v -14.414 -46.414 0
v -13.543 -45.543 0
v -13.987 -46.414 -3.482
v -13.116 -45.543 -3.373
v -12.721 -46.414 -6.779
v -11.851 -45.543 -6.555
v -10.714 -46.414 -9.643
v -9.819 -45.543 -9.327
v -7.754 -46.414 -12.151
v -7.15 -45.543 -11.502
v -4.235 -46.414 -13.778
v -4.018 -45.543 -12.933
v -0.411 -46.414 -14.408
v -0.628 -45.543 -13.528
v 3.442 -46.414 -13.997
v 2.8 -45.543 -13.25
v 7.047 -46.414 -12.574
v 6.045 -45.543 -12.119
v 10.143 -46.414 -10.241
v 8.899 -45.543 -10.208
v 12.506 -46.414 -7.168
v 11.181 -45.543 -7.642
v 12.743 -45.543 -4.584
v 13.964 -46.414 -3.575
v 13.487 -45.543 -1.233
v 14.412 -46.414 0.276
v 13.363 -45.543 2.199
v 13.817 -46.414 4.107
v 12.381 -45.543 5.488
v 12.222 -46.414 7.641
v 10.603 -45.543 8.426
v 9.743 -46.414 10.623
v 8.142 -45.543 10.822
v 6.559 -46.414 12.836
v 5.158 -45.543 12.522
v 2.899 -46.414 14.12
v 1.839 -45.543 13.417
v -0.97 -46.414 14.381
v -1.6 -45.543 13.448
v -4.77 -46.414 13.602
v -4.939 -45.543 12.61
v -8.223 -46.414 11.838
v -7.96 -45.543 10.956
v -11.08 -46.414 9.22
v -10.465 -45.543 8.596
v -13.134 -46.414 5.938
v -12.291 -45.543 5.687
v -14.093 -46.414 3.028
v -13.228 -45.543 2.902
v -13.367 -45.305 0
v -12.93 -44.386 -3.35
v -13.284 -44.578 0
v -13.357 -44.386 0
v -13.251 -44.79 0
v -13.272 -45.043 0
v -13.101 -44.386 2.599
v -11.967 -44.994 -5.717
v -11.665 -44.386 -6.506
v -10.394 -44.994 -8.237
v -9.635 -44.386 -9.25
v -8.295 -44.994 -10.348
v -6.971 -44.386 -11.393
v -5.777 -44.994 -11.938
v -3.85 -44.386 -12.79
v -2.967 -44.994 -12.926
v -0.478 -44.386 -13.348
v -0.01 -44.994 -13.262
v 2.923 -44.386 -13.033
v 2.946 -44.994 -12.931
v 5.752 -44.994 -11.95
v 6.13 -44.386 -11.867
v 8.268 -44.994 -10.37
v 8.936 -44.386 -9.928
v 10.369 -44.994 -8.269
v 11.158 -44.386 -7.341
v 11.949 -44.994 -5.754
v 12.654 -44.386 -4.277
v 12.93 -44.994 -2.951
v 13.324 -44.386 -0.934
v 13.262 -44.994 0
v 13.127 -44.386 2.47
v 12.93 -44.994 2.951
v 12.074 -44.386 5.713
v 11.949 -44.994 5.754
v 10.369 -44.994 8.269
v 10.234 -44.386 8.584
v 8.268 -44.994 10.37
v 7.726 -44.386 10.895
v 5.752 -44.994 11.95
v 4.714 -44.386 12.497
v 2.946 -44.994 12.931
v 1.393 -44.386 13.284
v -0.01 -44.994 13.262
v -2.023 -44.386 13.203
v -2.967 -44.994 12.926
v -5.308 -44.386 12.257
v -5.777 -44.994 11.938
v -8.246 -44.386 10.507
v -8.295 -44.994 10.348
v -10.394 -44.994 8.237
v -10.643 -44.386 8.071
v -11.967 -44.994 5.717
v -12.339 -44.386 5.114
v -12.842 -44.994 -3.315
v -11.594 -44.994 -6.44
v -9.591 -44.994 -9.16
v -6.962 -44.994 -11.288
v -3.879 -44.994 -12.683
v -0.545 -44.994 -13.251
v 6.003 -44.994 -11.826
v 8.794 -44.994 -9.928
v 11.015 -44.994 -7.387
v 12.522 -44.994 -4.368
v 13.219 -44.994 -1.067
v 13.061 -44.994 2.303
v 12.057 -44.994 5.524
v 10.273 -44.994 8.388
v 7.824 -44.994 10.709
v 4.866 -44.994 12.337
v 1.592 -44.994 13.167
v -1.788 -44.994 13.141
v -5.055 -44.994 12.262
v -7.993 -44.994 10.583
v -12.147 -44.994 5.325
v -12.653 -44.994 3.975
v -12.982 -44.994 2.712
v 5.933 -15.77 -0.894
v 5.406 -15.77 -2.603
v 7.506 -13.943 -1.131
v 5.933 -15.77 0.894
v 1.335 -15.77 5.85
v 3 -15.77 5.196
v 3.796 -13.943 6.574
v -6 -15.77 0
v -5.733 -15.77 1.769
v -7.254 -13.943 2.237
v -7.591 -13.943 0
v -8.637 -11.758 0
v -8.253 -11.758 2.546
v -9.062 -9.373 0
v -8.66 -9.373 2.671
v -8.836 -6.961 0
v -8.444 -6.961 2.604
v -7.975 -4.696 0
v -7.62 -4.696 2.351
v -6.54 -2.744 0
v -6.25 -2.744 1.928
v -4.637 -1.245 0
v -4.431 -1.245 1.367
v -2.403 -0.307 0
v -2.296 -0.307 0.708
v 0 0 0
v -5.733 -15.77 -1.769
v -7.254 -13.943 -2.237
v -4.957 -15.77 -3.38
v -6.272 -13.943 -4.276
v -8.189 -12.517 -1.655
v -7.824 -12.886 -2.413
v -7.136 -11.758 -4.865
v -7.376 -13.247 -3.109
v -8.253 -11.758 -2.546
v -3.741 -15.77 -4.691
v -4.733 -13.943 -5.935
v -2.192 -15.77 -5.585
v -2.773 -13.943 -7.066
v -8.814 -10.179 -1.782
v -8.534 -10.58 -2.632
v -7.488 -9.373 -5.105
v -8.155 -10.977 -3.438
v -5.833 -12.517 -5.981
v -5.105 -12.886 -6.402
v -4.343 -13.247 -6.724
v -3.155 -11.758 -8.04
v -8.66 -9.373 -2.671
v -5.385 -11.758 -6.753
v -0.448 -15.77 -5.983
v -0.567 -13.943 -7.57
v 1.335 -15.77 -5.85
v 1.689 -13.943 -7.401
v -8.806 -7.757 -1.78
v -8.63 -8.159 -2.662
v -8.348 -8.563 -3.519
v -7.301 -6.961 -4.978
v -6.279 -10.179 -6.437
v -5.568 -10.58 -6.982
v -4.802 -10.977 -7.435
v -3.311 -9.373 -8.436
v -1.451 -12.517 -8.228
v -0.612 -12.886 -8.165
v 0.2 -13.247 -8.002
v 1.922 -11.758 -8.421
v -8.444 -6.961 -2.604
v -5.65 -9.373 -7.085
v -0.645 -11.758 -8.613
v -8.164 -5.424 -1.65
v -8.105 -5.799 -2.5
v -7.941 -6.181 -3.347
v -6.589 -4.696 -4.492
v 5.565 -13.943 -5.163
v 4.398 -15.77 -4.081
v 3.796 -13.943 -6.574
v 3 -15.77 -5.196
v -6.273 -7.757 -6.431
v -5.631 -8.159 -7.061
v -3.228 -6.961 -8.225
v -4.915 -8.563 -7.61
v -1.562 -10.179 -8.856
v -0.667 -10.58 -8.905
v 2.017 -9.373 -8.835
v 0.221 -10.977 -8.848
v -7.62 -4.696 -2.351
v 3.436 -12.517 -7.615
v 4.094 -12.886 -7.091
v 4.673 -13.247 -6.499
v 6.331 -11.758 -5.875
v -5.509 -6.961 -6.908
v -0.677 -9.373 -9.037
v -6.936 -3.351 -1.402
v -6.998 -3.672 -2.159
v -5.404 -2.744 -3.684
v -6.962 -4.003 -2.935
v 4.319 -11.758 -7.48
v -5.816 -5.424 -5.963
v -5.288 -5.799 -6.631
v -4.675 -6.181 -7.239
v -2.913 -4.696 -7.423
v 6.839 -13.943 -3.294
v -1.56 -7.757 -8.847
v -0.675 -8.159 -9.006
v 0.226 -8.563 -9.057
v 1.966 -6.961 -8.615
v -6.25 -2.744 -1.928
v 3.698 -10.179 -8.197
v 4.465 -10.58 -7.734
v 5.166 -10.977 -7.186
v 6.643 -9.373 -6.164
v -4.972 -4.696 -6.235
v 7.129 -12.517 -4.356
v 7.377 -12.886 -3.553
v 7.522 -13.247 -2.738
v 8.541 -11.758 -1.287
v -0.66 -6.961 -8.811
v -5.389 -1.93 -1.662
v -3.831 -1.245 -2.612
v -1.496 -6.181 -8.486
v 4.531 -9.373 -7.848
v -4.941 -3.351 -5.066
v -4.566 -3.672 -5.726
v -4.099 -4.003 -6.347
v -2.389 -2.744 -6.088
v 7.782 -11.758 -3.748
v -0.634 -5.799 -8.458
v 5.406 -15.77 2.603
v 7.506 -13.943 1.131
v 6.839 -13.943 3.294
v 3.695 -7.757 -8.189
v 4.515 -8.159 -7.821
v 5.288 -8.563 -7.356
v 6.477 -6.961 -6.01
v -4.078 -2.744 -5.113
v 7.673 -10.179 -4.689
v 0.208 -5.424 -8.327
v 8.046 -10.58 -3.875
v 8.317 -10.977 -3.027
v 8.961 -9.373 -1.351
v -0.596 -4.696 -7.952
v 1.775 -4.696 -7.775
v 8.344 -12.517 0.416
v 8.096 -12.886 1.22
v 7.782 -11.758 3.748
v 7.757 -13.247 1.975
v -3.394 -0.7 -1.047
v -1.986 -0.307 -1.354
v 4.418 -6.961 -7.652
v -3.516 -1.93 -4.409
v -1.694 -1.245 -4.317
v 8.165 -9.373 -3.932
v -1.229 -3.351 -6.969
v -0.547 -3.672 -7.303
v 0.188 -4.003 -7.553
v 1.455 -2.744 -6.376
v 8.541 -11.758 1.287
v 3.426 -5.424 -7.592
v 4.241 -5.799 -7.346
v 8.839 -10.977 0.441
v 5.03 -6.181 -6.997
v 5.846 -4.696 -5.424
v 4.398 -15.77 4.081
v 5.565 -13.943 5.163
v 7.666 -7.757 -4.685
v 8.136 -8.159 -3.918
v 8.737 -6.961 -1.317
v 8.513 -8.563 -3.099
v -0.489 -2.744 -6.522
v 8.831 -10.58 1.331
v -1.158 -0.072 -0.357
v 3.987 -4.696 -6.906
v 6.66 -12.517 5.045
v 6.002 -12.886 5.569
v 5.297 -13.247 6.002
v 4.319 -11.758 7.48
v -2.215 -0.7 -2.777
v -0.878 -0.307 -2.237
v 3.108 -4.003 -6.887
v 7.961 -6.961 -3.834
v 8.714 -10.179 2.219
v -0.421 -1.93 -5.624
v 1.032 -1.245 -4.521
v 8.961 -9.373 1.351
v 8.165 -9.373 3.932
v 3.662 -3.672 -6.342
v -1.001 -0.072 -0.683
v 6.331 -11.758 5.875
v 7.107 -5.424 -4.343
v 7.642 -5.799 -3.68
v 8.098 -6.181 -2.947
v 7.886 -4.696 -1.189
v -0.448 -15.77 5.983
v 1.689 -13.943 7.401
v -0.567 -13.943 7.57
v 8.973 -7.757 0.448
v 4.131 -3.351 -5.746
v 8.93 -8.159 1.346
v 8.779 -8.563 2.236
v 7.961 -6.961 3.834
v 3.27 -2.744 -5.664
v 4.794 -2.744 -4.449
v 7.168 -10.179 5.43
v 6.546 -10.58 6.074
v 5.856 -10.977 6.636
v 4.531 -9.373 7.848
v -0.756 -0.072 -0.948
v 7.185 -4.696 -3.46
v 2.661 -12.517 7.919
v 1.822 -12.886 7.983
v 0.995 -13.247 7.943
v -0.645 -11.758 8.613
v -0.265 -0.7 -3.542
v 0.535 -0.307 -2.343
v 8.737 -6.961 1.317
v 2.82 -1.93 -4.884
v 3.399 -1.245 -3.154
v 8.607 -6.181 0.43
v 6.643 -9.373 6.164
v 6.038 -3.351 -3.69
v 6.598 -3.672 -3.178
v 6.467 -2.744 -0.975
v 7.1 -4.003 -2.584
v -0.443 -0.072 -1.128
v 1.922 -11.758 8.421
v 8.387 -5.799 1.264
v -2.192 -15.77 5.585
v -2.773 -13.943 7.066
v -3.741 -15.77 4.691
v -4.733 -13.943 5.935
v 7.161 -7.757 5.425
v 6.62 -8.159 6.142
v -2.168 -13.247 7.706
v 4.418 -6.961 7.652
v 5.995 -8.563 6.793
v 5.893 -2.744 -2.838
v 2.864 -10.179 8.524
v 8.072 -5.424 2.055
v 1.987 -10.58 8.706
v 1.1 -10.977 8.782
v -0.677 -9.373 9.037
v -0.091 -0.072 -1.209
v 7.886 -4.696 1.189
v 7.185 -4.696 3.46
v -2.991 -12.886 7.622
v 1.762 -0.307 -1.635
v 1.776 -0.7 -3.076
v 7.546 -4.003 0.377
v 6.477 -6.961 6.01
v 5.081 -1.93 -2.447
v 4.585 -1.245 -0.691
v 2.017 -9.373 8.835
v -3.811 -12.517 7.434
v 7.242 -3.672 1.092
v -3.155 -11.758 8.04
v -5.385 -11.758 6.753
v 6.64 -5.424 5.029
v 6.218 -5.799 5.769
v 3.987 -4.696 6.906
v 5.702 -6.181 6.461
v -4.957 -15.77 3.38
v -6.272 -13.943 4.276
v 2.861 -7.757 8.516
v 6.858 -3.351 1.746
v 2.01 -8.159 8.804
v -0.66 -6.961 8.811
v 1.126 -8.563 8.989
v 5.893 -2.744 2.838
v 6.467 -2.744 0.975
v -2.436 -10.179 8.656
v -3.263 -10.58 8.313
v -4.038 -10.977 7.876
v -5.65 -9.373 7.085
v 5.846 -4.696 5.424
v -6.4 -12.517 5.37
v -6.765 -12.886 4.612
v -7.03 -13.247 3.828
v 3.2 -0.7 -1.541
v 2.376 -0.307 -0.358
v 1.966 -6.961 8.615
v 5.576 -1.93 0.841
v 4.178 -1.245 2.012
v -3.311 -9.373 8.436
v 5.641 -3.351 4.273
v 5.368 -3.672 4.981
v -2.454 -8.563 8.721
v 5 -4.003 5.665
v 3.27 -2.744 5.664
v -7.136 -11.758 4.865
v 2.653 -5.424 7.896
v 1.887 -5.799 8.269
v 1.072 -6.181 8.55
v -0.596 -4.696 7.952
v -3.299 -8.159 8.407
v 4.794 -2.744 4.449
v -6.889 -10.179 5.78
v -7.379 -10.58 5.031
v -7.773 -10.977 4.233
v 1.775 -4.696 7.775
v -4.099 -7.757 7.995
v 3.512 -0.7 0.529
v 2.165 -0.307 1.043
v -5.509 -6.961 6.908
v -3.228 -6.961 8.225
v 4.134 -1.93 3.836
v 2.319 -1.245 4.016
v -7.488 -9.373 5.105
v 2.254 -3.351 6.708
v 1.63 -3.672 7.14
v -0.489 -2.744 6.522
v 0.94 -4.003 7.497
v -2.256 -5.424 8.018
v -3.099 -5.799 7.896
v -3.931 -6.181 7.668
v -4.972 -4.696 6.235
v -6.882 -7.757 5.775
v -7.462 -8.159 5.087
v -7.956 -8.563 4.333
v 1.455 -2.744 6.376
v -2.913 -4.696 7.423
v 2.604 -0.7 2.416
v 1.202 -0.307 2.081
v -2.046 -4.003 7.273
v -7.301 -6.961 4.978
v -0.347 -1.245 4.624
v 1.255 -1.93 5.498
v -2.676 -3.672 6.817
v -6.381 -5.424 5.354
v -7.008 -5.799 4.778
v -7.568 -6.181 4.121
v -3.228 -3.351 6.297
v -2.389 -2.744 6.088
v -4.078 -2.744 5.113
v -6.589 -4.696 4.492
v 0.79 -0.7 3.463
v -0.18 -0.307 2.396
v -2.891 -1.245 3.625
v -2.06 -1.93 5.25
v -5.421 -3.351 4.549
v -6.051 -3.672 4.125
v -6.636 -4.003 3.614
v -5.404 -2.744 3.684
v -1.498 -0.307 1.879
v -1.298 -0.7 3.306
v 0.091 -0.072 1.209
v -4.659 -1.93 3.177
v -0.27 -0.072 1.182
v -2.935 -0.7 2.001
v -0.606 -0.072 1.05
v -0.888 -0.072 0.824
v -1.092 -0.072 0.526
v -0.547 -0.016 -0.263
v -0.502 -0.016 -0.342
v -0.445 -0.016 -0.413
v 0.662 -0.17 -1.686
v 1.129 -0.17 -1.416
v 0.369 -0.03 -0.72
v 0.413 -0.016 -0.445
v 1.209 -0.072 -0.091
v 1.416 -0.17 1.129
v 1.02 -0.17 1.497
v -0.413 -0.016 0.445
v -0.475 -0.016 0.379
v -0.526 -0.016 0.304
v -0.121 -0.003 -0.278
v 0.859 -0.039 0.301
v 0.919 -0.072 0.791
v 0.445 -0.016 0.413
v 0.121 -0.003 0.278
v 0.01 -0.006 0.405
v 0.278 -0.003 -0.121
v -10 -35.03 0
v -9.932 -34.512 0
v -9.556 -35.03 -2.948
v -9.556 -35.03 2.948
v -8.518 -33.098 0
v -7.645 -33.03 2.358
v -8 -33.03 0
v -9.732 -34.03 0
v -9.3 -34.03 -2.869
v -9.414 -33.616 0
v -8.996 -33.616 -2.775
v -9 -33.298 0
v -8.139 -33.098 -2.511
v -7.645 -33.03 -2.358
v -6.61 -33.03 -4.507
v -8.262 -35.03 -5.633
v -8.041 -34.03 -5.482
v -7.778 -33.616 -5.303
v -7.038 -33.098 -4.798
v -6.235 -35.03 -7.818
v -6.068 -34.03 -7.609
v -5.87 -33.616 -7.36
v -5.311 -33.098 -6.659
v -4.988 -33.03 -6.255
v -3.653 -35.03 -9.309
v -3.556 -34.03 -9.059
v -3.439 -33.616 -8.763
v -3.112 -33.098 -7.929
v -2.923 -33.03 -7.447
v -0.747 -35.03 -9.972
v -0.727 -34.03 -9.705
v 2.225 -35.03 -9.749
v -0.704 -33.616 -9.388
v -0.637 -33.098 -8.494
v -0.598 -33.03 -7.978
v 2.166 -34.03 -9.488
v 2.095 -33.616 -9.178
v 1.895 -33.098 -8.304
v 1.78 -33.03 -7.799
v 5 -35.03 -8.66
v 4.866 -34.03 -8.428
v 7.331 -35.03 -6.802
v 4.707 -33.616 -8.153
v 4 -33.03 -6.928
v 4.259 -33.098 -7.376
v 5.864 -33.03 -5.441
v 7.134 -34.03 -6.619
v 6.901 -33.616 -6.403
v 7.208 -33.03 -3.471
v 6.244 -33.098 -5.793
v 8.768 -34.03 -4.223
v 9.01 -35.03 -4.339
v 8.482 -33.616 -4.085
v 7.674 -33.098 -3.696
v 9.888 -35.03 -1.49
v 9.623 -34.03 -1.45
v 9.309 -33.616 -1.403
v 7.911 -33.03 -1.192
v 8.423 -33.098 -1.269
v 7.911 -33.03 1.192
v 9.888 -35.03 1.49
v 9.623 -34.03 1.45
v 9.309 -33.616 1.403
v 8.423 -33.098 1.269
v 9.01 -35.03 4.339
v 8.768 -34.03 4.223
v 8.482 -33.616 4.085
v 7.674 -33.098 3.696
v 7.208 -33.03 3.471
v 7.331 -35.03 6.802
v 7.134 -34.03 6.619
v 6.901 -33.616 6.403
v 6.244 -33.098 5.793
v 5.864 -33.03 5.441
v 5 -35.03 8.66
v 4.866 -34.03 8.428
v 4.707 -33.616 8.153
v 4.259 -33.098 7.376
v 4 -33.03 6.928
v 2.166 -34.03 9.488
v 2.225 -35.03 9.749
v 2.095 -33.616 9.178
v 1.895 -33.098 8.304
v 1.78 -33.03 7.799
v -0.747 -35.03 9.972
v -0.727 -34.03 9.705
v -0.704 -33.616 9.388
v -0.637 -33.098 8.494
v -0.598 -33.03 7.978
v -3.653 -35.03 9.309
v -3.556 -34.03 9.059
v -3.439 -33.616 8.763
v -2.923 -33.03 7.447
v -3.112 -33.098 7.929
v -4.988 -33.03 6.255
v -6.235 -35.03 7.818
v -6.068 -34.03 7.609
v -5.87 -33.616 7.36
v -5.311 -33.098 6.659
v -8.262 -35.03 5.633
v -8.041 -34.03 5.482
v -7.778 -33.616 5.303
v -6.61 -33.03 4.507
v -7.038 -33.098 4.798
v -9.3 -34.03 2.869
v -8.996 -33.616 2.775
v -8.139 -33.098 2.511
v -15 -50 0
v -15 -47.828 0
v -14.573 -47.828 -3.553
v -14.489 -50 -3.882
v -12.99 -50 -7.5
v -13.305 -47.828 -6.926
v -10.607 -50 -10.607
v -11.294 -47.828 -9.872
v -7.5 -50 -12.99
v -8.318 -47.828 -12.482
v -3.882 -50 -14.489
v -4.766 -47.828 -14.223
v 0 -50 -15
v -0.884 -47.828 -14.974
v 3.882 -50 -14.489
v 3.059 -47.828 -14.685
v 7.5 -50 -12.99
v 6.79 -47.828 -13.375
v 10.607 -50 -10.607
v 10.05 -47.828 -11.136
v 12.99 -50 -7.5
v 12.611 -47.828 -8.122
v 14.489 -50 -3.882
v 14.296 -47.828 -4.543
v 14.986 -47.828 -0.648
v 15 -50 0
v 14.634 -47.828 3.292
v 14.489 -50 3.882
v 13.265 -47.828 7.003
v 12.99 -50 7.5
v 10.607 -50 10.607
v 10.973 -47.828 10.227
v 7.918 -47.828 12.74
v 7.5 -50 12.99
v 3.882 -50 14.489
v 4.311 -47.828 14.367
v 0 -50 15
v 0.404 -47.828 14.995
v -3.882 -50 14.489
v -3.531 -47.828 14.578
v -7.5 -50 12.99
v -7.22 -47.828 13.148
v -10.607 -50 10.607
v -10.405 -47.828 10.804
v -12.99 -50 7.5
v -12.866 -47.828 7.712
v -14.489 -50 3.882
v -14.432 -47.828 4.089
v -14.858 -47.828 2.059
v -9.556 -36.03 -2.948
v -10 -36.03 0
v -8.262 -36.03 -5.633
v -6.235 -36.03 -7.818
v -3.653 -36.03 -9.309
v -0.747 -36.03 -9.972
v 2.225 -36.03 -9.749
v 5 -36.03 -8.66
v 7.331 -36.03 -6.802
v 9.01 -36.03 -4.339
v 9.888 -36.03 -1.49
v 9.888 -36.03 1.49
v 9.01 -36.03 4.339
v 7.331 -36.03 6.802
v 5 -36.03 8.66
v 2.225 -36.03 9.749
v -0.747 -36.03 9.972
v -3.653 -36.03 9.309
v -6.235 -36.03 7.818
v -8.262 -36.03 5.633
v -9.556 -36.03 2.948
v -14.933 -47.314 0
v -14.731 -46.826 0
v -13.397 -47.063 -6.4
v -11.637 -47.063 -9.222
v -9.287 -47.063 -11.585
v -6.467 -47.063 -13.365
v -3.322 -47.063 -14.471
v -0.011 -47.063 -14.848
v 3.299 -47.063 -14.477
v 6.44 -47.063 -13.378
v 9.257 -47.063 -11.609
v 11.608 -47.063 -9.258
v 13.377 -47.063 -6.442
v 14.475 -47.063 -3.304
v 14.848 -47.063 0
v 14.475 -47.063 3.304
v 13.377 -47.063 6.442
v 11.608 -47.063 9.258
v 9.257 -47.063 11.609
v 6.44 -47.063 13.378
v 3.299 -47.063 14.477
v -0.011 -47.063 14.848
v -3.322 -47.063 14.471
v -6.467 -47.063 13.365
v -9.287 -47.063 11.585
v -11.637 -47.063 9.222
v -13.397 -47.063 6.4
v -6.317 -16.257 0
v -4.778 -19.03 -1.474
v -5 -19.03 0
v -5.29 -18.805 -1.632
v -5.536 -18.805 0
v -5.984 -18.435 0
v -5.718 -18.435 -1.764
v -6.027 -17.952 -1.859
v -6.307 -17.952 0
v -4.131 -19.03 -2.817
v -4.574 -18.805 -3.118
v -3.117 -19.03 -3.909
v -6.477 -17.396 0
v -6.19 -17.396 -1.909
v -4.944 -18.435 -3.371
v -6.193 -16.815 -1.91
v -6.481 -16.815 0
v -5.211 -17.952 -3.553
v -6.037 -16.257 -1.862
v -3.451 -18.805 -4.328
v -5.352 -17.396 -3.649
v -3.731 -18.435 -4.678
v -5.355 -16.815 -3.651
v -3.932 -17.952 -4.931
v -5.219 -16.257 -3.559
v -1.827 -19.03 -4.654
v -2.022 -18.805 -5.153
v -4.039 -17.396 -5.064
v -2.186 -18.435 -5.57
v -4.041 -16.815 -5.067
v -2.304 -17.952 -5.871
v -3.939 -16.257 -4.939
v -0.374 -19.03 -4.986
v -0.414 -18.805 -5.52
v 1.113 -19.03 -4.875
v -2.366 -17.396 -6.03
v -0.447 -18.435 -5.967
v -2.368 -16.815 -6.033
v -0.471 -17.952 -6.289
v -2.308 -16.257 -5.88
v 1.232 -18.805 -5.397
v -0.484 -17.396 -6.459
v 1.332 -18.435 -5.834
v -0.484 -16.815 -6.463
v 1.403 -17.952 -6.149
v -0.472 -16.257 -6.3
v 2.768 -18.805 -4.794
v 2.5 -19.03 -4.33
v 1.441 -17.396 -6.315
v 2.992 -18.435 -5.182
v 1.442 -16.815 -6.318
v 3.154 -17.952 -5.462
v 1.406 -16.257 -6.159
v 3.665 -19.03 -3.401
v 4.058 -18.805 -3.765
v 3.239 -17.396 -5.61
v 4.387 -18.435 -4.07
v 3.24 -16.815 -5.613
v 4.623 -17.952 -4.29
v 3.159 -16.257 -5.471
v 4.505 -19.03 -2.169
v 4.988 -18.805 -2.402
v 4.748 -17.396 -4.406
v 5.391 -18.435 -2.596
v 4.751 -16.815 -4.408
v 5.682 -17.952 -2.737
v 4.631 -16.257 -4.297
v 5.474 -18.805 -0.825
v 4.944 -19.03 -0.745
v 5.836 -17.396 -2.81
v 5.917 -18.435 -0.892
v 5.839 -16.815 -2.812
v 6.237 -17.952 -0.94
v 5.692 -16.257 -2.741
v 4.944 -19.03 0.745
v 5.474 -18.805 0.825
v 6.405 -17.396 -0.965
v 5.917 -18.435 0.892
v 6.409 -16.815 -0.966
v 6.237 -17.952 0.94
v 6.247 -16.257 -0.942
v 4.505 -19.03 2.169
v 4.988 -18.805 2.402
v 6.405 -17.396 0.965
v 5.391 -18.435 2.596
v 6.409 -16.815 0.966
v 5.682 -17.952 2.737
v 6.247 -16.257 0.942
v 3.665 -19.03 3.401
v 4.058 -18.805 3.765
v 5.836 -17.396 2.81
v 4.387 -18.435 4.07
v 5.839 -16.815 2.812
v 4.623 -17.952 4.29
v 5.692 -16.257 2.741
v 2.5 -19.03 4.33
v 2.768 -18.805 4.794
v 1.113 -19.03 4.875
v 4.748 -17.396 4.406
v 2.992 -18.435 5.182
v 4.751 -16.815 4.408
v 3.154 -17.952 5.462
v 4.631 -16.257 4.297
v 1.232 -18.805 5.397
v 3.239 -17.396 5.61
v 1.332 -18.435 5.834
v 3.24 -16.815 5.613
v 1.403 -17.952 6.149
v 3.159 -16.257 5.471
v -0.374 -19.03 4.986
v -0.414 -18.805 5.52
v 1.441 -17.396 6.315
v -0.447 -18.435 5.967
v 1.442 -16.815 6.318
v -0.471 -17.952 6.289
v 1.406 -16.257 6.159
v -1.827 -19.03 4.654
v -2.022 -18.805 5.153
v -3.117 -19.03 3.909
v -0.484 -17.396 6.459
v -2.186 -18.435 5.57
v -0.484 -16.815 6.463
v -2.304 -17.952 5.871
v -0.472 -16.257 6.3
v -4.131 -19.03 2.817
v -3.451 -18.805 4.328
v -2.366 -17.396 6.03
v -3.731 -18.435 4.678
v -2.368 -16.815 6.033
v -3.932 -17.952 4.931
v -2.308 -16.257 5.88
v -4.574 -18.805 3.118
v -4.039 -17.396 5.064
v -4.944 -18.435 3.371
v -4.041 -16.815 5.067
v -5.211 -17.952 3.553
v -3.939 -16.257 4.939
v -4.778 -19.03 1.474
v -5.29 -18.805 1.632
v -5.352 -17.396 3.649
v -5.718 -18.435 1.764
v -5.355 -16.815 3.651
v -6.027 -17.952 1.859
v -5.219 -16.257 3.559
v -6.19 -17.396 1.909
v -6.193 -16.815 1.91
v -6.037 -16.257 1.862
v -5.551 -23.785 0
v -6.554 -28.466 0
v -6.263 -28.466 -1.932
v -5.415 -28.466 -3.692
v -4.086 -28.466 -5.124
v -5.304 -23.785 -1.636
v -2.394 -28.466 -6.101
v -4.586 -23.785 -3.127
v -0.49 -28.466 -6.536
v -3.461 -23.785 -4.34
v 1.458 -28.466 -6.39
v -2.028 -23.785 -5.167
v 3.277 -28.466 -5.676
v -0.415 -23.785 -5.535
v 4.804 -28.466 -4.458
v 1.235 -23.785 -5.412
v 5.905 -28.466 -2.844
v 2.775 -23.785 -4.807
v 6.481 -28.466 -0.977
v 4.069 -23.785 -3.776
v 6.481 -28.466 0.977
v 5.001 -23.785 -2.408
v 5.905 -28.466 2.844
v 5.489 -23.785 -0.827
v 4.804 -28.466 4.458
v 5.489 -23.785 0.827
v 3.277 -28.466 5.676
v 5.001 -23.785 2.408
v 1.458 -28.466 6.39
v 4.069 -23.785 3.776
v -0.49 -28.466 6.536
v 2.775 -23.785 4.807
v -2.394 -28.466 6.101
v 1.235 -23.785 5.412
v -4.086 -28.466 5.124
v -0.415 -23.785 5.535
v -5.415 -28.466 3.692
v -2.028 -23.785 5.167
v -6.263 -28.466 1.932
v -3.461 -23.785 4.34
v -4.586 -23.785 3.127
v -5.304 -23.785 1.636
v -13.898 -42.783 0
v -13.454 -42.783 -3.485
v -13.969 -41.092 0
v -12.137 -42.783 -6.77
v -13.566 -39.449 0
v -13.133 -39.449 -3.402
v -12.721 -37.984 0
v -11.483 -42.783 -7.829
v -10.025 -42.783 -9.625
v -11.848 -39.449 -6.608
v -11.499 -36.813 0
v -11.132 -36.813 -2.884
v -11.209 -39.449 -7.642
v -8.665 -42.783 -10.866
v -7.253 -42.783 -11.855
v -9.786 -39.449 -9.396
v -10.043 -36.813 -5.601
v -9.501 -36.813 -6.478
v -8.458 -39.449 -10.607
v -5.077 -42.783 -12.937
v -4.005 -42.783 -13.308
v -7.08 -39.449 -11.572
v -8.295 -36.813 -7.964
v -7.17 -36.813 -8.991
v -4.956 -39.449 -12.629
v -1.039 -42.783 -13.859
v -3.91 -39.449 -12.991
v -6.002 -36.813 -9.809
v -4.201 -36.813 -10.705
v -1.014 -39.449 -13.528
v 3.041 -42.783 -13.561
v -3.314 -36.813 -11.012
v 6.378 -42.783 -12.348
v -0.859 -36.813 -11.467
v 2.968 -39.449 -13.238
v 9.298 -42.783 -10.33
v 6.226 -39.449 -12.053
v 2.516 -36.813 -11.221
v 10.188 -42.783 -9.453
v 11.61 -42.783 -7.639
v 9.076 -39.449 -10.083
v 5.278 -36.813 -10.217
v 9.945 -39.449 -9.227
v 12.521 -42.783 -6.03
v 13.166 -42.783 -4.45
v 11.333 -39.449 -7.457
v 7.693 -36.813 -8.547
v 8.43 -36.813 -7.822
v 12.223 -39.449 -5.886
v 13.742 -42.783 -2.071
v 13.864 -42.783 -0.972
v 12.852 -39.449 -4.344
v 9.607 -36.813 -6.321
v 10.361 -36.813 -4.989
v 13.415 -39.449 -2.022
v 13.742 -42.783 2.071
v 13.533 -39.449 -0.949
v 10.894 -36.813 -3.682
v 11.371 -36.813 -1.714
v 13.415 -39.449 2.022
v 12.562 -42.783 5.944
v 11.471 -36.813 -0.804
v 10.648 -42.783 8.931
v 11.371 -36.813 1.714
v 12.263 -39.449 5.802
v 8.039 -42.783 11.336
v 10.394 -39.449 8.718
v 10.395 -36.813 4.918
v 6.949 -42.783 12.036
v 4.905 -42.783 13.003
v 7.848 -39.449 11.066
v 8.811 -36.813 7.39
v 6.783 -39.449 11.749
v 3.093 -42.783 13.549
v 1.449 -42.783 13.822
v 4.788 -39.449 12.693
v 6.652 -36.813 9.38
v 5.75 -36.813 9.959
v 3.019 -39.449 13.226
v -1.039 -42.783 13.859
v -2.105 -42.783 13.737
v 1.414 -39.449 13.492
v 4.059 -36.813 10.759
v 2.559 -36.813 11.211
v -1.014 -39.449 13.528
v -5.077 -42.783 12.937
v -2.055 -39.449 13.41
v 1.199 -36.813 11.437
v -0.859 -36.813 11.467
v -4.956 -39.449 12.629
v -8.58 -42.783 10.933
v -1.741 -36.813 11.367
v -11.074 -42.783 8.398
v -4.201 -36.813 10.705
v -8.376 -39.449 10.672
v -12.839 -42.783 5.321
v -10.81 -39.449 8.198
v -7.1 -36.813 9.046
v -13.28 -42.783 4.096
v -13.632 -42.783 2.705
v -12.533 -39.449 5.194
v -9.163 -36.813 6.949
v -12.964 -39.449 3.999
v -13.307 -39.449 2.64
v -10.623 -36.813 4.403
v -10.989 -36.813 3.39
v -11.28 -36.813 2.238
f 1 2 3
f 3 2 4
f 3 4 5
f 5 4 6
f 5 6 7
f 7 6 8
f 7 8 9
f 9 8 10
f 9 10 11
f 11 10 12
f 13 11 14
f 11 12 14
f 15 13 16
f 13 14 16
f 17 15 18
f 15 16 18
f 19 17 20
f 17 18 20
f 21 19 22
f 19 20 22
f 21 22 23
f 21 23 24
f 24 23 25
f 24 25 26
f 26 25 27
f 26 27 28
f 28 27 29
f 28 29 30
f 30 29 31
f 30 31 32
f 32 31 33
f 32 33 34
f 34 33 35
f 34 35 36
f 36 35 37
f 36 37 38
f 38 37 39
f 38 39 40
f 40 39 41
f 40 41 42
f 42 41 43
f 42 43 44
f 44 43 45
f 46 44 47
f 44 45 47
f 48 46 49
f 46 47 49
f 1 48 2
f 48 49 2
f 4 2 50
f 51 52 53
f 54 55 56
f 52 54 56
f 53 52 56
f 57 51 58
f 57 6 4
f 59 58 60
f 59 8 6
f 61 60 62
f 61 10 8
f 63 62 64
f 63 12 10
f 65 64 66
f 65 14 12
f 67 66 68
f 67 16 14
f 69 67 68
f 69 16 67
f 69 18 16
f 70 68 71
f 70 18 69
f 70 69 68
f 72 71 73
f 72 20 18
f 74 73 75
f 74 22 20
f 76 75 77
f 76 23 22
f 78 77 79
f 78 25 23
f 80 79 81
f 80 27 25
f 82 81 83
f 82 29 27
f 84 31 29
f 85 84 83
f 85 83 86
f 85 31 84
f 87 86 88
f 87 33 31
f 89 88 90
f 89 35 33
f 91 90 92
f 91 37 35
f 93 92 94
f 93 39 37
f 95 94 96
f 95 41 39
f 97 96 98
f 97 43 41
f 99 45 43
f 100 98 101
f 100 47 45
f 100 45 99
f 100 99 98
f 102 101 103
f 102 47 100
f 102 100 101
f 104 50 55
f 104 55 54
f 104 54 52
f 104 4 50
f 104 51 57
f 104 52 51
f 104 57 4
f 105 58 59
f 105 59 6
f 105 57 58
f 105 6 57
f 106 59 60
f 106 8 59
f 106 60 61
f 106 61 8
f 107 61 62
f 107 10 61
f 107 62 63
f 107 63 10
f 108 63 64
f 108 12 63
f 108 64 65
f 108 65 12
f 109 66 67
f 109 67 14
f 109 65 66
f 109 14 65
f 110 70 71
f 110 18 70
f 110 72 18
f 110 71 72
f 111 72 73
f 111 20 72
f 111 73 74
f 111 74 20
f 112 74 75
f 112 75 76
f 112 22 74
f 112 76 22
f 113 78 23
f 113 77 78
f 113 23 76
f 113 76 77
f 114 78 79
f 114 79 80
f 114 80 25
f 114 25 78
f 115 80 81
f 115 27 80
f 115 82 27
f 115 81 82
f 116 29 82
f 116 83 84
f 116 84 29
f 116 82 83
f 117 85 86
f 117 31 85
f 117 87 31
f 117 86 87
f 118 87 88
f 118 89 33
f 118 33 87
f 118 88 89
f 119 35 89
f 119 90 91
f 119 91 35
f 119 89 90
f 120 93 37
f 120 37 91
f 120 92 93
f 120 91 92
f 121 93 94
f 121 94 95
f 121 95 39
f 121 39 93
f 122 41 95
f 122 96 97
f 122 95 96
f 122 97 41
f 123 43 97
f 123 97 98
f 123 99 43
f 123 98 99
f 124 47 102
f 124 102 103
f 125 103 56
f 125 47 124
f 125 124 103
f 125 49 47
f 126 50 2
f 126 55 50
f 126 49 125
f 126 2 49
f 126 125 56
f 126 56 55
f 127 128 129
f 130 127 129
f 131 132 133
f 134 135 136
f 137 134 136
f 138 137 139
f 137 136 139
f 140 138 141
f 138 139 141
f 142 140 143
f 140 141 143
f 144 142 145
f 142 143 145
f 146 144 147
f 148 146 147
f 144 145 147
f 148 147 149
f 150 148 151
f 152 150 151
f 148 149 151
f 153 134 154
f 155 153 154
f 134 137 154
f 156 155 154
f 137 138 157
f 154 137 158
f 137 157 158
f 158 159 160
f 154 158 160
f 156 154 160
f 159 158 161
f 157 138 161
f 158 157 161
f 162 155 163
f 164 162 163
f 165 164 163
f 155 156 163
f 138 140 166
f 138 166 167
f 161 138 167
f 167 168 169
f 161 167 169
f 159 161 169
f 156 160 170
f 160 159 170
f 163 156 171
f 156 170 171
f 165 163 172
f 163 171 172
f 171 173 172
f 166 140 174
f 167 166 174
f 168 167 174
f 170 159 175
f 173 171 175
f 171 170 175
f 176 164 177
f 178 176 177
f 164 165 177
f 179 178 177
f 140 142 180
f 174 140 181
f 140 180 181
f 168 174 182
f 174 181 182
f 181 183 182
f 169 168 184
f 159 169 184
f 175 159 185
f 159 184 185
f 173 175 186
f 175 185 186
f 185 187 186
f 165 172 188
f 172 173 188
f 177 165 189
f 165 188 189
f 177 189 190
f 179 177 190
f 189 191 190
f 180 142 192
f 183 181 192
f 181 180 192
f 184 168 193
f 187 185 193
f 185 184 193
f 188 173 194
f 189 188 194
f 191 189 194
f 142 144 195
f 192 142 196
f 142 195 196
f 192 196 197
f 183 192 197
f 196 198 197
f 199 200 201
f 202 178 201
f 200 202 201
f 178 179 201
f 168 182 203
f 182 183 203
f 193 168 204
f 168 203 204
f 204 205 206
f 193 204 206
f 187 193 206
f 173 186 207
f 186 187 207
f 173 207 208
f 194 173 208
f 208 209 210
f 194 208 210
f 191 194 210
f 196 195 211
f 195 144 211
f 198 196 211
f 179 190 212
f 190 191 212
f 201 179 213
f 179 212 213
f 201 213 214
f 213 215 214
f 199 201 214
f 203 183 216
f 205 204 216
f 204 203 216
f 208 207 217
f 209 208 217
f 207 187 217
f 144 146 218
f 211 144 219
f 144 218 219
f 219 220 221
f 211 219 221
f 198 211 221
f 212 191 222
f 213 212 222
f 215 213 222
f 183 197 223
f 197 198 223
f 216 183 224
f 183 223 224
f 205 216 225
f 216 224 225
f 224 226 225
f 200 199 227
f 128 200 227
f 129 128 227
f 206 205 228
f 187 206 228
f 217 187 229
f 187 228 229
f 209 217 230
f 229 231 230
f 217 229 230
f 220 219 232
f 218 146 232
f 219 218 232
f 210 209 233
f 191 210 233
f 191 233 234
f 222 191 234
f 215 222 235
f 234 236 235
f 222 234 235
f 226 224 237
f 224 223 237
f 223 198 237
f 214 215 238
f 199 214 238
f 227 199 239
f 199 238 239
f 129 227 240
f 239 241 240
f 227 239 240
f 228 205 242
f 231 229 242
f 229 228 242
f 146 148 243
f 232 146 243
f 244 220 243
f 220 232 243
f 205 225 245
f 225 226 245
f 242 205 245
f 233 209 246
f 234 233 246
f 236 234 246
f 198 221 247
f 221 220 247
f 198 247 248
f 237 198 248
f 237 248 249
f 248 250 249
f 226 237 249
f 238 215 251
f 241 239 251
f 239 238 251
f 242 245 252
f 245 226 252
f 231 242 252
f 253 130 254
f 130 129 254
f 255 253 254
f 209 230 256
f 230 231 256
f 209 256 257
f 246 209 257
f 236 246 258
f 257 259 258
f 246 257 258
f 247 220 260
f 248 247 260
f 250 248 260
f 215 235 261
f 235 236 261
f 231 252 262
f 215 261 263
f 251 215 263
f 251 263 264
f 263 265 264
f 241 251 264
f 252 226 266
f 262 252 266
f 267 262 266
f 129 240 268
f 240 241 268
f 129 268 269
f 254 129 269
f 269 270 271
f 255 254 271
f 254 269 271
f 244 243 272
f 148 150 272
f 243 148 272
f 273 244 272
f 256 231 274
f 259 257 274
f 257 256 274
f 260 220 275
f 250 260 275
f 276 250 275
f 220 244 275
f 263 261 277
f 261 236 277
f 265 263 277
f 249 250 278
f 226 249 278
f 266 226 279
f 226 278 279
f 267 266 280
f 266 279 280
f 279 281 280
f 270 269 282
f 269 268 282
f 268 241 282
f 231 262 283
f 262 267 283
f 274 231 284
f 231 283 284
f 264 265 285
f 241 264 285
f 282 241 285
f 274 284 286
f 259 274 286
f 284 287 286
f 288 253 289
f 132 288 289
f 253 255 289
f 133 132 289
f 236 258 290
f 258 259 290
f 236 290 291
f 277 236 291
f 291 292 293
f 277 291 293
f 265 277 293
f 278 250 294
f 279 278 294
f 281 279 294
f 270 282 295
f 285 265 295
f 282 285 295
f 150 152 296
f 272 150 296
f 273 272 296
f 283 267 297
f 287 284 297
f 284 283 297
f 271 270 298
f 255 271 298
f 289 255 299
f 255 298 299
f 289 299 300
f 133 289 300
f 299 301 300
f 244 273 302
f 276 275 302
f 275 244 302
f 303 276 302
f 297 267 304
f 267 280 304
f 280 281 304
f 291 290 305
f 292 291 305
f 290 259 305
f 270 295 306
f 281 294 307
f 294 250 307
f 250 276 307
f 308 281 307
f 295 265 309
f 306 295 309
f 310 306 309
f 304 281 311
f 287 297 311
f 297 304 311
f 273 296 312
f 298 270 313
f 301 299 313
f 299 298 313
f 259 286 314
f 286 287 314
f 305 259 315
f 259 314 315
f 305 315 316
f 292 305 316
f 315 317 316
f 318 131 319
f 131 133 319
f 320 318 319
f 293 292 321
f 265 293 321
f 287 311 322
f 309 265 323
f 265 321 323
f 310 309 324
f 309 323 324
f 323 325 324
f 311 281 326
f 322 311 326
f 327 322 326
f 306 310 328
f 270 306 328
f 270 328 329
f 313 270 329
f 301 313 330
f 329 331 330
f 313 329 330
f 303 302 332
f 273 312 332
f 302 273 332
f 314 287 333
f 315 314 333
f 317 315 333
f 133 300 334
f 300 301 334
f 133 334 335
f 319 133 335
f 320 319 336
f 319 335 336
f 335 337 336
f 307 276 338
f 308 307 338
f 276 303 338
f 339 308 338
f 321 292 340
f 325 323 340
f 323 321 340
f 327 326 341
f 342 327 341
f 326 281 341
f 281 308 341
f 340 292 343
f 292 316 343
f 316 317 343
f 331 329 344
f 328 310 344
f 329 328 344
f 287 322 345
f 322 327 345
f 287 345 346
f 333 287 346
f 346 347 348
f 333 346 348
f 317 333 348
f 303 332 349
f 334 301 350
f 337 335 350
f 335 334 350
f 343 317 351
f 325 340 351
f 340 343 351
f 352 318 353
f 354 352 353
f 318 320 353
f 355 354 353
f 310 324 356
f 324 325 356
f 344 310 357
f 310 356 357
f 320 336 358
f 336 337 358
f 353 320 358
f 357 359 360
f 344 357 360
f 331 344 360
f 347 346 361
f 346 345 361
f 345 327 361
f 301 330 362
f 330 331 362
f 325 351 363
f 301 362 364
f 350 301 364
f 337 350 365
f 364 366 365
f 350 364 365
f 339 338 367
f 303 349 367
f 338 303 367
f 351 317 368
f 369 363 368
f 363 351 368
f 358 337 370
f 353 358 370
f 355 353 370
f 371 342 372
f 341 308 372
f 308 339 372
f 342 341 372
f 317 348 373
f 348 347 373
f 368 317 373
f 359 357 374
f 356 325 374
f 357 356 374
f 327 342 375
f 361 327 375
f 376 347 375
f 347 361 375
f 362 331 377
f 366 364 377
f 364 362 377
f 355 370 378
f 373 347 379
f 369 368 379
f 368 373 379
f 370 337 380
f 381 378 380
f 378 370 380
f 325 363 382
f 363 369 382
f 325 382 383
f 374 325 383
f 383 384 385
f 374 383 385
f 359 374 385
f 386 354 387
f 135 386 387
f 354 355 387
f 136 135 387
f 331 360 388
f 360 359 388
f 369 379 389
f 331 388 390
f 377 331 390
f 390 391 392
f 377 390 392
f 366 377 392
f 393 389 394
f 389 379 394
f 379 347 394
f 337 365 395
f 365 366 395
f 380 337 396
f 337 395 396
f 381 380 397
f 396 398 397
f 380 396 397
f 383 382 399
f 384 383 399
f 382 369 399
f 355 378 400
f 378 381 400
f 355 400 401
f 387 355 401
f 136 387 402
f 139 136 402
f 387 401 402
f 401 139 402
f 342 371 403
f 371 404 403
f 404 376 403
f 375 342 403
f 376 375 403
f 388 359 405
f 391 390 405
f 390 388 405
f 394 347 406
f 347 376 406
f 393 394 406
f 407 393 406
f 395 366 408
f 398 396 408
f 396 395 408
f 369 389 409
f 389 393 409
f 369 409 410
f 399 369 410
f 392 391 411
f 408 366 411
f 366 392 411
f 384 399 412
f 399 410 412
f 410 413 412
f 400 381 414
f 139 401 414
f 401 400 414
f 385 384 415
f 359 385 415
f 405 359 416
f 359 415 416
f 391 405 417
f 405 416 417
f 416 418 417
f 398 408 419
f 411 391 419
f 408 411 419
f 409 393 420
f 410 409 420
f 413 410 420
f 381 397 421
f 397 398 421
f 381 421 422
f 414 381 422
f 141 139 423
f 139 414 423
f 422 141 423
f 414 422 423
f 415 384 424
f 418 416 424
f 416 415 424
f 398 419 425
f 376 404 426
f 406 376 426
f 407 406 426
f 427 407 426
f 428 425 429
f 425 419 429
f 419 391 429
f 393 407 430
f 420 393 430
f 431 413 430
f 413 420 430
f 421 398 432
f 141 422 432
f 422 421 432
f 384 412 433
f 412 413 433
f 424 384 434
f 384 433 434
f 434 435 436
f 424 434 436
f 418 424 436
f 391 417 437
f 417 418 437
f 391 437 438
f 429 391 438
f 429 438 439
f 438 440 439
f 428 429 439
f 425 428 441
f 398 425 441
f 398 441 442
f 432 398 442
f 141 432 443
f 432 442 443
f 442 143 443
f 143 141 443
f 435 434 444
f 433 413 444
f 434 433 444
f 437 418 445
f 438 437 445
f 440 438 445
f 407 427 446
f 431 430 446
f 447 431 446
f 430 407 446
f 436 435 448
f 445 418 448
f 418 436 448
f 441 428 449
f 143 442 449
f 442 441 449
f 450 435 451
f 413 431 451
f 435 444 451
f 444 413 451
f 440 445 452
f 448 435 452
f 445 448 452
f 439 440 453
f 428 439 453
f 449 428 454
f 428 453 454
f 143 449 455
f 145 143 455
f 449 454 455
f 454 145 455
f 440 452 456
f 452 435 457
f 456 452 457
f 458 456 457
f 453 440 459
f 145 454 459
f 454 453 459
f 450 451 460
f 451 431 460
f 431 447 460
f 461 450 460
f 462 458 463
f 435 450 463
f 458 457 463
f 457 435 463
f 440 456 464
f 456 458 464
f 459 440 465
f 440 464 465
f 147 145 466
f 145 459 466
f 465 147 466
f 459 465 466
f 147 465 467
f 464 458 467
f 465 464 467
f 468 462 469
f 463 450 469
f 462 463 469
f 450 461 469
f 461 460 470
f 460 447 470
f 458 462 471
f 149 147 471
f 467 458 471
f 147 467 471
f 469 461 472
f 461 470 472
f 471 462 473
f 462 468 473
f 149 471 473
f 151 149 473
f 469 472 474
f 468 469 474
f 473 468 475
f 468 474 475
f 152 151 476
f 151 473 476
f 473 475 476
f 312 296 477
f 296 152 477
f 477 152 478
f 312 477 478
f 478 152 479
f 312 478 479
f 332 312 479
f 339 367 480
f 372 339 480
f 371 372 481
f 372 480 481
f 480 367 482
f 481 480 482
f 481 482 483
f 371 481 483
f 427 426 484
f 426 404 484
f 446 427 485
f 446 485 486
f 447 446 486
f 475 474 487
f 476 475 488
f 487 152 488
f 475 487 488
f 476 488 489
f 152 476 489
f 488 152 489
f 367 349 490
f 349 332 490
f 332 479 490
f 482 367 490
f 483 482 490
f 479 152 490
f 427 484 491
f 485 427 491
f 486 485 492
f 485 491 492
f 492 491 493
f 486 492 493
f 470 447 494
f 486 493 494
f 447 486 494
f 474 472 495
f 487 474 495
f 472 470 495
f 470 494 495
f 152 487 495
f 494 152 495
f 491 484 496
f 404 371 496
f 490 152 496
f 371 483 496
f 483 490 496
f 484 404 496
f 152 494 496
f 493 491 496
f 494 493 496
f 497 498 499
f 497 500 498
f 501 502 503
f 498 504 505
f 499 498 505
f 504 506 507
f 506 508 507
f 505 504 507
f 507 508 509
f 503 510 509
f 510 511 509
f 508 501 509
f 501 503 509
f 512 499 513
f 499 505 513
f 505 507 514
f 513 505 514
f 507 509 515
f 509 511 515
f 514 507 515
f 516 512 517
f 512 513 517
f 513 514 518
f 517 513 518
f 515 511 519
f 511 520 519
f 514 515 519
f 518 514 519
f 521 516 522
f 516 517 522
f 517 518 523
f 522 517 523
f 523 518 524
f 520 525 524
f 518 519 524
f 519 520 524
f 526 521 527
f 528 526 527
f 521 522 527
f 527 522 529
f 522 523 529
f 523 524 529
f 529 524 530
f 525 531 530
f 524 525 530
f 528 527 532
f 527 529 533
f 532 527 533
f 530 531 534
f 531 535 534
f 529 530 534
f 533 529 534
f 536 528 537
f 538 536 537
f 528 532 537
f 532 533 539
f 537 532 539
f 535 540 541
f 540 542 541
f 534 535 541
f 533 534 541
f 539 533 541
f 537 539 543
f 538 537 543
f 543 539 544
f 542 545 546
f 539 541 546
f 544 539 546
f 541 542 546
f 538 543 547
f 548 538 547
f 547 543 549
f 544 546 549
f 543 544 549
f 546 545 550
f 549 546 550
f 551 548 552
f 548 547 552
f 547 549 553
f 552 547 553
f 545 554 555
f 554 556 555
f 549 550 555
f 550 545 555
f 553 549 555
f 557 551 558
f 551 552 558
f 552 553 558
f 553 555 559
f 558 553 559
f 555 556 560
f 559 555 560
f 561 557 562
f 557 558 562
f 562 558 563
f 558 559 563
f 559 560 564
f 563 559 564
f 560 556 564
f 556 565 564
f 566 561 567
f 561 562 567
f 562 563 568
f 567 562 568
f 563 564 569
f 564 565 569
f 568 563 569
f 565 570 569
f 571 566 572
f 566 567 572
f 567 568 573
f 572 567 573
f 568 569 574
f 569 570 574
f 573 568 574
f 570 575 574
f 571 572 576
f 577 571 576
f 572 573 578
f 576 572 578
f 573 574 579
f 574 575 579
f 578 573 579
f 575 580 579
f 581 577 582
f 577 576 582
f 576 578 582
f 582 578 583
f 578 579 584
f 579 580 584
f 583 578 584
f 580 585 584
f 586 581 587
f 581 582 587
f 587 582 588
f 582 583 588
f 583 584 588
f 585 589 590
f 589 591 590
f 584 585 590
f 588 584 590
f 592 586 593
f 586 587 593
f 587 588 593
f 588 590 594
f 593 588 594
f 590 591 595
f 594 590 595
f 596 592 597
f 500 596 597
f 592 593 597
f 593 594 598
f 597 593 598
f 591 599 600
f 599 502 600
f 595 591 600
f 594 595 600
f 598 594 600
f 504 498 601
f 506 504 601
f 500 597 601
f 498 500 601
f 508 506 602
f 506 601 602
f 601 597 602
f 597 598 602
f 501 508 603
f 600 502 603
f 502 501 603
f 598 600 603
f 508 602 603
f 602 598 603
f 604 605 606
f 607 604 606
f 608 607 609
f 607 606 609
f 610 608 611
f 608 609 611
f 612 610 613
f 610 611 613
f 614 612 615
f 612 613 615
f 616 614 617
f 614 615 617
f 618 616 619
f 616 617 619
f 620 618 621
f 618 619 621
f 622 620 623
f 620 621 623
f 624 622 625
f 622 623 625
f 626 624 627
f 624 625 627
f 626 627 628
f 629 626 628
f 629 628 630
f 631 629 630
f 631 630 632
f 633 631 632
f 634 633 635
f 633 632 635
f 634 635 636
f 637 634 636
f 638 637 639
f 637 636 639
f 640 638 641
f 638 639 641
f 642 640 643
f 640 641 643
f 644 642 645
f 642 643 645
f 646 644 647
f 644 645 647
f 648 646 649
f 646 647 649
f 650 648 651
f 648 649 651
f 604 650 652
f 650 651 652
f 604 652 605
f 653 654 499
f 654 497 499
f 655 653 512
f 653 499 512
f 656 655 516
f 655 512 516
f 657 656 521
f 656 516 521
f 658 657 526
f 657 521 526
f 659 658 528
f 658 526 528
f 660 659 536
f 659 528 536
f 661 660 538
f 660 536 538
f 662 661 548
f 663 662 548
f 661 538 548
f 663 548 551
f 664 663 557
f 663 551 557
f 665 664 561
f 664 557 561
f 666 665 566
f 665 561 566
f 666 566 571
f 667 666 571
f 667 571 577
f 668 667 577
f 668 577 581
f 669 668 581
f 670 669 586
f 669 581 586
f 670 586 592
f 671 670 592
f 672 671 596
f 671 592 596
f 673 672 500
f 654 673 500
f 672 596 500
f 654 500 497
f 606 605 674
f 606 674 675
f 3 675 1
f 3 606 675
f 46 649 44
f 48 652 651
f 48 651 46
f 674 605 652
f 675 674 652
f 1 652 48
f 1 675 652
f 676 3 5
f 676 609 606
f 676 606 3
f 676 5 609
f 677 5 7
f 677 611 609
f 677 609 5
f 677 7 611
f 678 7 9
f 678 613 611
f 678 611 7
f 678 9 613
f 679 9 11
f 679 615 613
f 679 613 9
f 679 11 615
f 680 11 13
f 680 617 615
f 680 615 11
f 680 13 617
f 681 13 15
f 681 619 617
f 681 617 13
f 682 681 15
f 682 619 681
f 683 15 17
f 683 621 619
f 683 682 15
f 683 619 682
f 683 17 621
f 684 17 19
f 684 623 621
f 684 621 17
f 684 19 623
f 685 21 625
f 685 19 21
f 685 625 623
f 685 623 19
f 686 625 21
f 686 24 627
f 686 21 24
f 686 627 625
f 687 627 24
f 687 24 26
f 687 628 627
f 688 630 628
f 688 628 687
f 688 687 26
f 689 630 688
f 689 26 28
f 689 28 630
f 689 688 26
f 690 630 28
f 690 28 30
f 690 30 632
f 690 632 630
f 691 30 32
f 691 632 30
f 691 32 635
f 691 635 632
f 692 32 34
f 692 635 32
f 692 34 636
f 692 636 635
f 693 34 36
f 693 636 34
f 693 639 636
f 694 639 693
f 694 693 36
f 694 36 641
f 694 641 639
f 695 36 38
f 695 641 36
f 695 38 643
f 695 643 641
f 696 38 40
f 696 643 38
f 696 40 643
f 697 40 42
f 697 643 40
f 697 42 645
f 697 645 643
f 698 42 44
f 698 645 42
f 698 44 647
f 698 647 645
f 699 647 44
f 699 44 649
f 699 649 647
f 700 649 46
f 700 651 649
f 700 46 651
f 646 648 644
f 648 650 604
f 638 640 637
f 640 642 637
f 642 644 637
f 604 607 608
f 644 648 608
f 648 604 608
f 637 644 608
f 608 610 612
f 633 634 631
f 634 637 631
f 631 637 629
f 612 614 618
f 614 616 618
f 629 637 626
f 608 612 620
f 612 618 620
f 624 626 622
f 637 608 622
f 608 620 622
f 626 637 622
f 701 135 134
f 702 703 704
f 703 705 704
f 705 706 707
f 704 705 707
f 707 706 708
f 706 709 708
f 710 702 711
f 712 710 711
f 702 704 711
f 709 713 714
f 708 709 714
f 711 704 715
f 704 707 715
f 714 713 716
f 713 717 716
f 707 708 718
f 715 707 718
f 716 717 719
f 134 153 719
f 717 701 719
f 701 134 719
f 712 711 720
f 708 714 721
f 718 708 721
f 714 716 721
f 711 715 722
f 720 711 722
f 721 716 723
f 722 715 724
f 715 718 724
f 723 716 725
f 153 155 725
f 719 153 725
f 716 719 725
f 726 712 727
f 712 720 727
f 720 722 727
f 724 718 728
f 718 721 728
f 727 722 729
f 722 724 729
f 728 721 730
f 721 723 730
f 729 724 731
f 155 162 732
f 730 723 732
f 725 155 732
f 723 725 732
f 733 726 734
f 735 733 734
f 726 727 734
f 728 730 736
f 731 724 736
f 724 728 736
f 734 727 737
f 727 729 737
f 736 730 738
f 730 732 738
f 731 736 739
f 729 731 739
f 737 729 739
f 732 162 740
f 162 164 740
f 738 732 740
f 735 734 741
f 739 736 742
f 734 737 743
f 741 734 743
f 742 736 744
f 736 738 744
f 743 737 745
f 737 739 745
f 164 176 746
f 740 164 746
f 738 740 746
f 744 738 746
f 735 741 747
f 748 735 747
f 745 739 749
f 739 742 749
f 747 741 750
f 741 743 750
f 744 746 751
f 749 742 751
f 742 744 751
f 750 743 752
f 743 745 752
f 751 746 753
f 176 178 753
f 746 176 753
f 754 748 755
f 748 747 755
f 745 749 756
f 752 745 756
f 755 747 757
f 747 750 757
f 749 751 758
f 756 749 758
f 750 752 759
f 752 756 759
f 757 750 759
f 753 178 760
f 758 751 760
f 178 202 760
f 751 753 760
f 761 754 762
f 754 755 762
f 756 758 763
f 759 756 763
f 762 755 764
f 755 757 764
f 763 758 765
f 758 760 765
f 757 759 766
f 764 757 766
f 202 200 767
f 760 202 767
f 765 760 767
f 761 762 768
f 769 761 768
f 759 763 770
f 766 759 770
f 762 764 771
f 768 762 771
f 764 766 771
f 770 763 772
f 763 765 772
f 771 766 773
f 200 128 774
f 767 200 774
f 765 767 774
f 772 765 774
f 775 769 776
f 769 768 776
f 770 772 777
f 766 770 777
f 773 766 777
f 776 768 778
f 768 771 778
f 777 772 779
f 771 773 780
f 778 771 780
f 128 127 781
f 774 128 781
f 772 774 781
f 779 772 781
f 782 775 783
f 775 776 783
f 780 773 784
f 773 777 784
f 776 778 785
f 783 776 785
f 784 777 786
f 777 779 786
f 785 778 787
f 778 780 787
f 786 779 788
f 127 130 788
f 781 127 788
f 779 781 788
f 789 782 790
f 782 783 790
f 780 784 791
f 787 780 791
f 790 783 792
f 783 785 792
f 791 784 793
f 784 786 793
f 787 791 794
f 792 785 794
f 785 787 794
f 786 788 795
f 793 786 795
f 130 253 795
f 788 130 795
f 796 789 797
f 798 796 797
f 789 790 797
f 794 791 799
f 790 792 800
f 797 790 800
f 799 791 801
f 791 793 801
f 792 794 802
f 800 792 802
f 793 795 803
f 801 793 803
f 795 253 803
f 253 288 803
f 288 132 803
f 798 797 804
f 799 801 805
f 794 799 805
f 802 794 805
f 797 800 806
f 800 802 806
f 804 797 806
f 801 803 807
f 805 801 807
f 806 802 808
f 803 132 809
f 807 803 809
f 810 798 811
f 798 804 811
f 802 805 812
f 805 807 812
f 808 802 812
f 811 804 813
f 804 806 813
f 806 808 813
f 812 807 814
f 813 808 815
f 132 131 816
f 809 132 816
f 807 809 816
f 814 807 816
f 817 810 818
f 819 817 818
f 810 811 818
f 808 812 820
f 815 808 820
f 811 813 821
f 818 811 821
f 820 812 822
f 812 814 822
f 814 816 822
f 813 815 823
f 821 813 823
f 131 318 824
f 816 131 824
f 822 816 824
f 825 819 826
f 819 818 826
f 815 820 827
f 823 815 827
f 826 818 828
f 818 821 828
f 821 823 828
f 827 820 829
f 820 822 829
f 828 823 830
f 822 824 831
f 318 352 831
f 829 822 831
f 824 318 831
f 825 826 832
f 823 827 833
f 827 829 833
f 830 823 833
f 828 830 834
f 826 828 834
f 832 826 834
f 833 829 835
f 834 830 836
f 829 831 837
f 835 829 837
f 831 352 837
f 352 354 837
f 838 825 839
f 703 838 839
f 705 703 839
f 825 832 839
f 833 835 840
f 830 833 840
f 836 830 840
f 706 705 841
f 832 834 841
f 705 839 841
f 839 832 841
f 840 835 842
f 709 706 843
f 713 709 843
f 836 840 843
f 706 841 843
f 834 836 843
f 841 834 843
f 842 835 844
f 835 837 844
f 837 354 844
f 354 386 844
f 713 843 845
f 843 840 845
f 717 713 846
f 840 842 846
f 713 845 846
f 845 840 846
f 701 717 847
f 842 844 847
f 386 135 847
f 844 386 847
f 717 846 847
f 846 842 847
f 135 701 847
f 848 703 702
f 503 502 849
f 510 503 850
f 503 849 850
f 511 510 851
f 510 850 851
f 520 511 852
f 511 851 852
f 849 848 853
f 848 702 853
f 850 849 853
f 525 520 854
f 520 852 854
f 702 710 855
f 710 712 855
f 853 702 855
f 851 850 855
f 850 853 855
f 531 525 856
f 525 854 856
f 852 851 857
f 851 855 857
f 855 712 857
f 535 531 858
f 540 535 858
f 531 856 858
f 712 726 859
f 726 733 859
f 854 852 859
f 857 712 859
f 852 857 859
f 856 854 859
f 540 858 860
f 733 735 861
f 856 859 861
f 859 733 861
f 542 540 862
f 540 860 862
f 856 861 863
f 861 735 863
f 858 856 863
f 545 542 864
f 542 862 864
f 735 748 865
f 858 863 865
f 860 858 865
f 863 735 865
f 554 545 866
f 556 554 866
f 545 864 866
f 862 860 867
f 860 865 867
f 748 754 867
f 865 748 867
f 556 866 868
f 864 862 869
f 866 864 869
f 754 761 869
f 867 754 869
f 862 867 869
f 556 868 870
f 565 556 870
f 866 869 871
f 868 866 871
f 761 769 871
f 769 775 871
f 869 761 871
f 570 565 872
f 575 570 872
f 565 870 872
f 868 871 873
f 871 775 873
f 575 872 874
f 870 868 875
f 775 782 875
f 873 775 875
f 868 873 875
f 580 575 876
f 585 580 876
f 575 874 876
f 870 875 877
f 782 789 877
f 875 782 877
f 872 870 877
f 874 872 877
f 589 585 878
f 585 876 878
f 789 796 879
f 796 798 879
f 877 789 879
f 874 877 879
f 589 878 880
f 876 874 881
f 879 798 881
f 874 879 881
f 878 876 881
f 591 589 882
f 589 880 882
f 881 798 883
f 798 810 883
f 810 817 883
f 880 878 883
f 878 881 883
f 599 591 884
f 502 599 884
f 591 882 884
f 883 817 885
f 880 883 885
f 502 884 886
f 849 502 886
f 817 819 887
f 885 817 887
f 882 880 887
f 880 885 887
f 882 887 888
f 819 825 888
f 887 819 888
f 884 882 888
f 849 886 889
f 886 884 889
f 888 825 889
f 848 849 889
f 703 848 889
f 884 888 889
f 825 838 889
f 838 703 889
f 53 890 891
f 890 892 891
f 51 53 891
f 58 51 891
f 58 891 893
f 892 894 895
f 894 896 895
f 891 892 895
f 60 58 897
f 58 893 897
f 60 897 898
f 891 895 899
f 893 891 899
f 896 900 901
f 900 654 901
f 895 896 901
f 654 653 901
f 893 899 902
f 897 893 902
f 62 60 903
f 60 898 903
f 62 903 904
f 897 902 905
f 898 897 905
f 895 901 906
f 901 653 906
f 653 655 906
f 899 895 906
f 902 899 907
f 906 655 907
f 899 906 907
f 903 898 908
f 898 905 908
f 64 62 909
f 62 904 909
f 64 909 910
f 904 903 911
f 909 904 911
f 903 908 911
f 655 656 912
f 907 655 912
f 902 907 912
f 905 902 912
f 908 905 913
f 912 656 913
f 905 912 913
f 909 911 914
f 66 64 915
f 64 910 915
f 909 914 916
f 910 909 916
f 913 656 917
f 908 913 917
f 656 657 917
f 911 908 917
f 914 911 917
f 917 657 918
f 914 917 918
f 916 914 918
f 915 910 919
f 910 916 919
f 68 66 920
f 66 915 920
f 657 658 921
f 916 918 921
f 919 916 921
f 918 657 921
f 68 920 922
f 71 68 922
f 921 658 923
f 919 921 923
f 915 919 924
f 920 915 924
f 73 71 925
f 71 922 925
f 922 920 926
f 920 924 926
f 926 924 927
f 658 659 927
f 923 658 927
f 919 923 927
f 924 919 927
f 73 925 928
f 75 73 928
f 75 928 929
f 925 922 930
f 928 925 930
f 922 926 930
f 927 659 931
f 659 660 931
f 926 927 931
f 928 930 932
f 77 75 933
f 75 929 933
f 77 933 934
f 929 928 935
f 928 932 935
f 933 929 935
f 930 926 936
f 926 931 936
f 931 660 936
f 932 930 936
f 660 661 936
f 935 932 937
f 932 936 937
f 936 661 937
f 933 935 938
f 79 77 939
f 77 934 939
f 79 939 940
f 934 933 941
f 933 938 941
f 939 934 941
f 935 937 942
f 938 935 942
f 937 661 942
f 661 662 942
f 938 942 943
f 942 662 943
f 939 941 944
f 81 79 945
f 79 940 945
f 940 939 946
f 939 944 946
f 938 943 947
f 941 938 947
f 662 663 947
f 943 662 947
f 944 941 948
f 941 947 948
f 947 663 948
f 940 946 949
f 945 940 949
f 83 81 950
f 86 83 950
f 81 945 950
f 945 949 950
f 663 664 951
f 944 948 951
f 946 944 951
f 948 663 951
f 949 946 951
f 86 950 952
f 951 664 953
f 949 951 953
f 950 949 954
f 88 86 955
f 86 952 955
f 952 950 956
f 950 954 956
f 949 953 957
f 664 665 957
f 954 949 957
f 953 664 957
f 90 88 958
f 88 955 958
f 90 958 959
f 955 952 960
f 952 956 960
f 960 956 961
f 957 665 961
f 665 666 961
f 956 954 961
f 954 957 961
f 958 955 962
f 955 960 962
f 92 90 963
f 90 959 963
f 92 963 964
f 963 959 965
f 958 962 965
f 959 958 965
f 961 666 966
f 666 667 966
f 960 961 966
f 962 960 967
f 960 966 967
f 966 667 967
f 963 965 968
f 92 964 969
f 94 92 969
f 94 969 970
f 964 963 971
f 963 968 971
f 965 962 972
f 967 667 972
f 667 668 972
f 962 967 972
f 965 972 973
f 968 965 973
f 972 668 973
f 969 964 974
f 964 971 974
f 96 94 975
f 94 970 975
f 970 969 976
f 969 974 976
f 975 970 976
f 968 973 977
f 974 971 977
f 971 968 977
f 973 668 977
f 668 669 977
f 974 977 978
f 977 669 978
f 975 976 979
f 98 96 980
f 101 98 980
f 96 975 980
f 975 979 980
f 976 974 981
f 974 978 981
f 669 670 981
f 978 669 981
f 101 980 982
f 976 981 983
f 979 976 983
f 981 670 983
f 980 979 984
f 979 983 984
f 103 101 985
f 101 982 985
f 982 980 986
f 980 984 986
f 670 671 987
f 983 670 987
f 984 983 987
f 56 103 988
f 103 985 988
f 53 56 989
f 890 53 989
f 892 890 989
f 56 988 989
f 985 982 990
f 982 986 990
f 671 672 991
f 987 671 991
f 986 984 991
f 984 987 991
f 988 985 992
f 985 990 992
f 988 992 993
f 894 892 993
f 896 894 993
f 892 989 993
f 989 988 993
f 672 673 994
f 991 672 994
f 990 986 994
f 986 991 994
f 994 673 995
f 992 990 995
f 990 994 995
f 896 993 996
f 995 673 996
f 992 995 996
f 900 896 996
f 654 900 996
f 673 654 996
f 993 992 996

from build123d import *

# Parameters (mm, degrees)
FILLET1_R = 2
FILLET2_R = 1


with BuildPart() as part:
    # Sketch1 → Revolve1 (revolve)
    with BuildSketch(Plane.XY, mode=Mode.PRIVATE) as revolve1_sk:
        with BuildLine():
            Line((0, 0), (0, -50))
            Line((0, -50), (13, -50))
            Line((13, -50), (15, -50))
            Line((15, -50), (15, -47))
            Line((15, -47), (13, -45))
            ThreePointArc((13, -45), (13.689044296, -39.782878162), (10, -36.03))
            Line((10, -36.03), (10, -35.03))
            ThreePointArc((10, -35.03), (9.414213562, -33.615786438), (8, -33.03))
            ThreePointArc((8, -33.03), (5.996281337, -26.137939714), (5, -19.03))
            ThreePointArc((5, -19.03), (6.412519214, -17.679913869), (6, -15.77))
            ThreePointArc((6, -15.77), (8.481867275, -5.799318094), (0, 0))
        make_face()
    revolve(revolve1_sk.sketch.rotate(Axis((0, 0, 0), (0, -1, 0)), 180), axis=Axis((0, 0, 0), (0, -1, 0)))

    # Fillet1
    fillet1_edges = [part.edges().sort_by_distance(p)[0] for p in [
        (15, -47, 0),
    ]]
    fillet(fillet1_edges, radius=FILLET1_R)

    # Fillet2
    fillet2_edges = [part.edges().sort_by_distance(p)[0] for p in [
        (13, -45, 0),
    ]]
    fillet(fillet2_edges, radius=FILLET2_R)


solid = part.part
